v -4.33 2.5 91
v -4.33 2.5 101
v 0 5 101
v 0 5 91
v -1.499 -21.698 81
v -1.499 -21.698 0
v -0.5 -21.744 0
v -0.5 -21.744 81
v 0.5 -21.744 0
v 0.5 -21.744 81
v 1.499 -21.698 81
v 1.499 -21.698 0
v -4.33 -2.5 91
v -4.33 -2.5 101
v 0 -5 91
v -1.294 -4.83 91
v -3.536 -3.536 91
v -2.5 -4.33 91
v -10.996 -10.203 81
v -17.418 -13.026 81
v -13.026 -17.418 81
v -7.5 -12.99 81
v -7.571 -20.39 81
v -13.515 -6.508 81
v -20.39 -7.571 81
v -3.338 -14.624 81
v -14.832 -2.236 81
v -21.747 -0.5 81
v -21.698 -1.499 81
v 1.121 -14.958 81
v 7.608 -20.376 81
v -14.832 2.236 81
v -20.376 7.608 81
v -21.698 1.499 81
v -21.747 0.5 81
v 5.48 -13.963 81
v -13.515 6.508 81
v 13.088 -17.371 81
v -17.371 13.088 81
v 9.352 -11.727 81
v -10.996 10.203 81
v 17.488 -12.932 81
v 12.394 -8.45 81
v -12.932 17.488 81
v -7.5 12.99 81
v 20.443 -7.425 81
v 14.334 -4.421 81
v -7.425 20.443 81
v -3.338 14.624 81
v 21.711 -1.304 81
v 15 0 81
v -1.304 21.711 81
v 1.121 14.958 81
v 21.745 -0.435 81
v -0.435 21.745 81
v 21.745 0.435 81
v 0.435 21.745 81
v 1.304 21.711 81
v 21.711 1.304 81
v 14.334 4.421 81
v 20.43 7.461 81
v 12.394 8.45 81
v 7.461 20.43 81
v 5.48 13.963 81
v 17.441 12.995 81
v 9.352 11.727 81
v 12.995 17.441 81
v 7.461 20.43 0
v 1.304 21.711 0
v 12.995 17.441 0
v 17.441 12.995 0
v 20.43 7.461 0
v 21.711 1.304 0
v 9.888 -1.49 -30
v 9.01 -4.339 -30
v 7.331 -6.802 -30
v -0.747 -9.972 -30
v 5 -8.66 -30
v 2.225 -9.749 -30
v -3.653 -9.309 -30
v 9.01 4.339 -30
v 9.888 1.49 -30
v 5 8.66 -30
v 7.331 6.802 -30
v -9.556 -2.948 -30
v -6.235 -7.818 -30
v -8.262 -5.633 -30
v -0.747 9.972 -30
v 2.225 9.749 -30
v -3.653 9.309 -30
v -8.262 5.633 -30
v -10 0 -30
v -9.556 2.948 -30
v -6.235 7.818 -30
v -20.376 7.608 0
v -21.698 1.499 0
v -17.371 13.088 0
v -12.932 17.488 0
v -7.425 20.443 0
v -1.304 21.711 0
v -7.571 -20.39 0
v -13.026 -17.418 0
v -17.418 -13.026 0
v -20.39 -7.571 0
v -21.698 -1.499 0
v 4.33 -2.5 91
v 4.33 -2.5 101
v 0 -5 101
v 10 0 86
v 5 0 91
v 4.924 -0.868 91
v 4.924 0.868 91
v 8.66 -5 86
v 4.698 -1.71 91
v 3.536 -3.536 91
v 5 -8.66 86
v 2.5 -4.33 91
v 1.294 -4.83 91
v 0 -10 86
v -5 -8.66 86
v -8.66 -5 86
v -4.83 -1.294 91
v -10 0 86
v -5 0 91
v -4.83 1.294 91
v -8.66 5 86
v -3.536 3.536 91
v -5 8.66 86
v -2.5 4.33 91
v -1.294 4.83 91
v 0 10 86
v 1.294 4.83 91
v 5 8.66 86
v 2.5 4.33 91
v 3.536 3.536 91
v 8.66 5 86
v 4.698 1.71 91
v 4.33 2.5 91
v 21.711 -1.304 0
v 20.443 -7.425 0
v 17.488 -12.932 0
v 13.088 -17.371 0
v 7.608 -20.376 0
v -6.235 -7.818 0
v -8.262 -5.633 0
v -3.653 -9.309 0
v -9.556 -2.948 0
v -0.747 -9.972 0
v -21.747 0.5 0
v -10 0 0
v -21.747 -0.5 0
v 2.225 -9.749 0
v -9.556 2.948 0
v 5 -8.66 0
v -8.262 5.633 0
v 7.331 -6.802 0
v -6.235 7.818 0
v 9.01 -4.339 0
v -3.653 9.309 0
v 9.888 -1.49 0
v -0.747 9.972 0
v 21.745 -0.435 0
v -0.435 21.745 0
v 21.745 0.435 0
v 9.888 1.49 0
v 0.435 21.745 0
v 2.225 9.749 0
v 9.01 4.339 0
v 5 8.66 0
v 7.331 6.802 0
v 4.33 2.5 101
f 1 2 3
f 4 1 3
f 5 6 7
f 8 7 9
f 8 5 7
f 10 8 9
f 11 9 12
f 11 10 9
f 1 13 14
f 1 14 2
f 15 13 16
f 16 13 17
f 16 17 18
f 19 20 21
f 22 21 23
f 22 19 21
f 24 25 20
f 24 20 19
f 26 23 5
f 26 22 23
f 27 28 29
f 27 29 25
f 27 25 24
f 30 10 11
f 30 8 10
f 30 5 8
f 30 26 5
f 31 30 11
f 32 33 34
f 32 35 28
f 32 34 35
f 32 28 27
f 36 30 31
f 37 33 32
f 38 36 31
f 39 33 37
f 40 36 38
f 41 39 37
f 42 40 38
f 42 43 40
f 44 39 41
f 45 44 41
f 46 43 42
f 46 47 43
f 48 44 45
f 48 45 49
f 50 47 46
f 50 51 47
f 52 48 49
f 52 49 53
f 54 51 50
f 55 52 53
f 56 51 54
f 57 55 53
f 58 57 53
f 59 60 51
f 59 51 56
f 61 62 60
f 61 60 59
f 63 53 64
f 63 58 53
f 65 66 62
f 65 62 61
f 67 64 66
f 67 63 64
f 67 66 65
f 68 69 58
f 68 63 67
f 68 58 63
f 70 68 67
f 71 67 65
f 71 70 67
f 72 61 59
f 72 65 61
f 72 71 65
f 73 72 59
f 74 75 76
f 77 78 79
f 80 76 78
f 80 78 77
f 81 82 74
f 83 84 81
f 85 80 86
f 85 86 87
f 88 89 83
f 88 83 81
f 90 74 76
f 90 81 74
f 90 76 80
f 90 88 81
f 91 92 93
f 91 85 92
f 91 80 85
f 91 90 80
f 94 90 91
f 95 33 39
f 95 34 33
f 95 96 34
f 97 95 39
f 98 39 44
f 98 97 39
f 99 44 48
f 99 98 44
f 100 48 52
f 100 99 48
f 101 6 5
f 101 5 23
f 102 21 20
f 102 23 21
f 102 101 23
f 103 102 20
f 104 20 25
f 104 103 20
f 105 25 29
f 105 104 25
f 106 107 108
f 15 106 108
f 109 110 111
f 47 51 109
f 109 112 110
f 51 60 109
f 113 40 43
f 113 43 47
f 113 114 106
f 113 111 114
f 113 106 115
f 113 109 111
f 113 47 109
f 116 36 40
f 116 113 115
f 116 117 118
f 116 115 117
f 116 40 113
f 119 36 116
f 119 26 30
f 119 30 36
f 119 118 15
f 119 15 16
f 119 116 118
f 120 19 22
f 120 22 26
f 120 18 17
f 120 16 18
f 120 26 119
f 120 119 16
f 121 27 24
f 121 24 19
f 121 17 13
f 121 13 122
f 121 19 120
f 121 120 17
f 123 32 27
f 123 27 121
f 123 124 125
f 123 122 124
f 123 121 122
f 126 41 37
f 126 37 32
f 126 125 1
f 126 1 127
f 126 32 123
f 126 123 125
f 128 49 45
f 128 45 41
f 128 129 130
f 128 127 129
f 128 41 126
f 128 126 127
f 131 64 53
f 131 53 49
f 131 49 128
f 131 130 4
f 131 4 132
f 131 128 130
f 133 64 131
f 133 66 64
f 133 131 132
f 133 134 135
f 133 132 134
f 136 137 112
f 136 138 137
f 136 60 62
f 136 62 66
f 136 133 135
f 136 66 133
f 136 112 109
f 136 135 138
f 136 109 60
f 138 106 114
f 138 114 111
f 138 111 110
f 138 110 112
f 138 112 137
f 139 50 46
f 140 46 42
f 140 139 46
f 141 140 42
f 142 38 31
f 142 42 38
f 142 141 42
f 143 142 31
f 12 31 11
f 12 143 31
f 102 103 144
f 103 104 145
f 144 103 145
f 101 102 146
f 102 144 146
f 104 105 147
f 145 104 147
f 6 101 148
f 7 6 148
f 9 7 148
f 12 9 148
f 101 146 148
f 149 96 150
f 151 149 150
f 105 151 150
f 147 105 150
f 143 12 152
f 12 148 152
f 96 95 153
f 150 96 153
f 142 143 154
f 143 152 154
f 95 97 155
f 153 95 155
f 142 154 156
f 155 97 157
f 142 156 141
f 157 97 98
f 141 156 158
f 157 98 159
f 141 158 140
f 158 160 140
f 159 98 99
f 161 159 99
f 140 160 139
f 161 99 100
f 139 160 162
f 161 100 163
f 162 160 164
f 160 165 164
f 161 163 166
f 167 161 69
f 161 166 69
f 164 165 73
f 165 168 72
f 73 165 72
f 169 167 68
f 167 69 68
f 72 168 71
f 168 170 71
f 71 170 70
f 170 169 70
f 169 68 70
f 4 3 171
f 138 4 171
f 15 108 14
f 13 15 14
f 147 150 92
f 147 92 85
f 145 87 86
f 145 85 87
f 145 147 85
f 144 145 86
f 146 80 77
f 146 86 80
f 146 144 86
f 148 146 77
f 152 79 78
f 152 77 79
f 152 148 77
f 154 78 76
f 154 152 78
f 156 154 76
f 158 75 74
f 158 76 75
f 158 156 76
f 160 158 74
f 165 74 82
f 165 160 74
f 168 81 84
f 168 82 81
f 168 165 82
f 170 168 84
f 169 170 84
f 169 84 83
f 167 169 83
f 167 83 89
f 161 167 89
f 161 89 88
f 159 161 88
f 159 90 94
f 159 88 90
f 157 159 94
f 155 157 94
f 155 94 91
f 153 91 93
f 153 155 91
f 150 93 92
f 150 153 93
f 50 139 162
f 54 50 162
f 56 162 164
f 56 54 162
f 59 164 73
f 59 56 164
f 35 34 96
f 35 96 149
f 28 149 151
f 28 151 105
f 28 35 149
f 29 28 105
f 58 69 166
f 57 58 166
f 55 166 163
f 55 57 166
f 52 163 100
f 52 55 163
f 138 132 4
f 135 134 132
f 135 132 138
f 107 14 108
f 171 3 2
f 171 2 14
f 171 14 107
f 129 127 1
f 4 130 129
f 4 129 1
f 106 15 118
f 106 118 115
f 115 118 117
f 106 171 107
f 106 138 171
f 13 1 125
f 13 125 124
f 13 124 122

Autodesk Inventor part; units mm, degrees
ref_plane "YZ Plane" through (0, 0, 0) normal (1, 0, 0) x (0, 1, 0)
ref_plane "XZ Plane" through (0, 0, 0) normal (0, 1, 0) x (-1, 0, 0)
ref_plane "XY Plane" through (0, 0, 0) normal (0, 0, 1) x (1, 0, 0)
sketch "Boceto1" plane through (0, 0, 0) normal (0, 0, 1) x (1, 0, 0)
  circle A0 centre (0, 0) radius 21.75
  arc A1 (1.304413, 21.71085) -> (0, 23.055) centre (0, 21.75) ccw
  arc A2 (0, 23.055) -> (-1.304413, 21.71085) centre (0, 21.75) ccw
  line L0 (0, -21.75) -> (0, -23.25)
  arc A3 (0, -23.25) -> (1.499108, -21.698276) centre (0, -21.75) ccw
  arc A4 (-1.499108, -21.698276) -> (0, -23.25) centre (0, -21.75) ccw
  line L1 (21.75, 0) -> (23.055, 0)
  line L2 (-21.75, 0) -> (-23.25, 0)
  arc A5 (-21.698276, 1.499108) -> (-21.698276, -1.499108) centre (-21.75, 0) ccw
  arc A6 (21.71085, -1.304413) -> (21.71085, 1.304413) centre (21.75, 0) ccw
  dimension "d0" = 43.5
  dimension "d2" = 1.5
  dimension "d4" = 1.5
extrude "Extrusión1" add sketch "Boceto1" along normal blind 81
sketch "Boceto2" plane through (0, 0, 81) normal (0, 0, 1) x (1, 0, 0)
  line L0 (0, 5) -> (4.330127, 2.5)
  line L1 (4.330127, 2.5) -> (4.330127, -2.5)
  line L2 (4.330127, -2.5) -> (0, -5)
  line L3 (0, -5) -> (-4.330127, -2.5)
  line L4 (-4.330127, -2.5) -> (-4.330127, 2.5)
  line L5 (-4.330127, 2.5) -> (0, 5)
  point P0 (0, 0)
  point P1 (0, 0)
extrude "Extrusión2" add sketch "Boceto2" along normal blind 20
sketch "Boceto10" plane through (0, 0, 0) normal (0, 0, -1) x (-1, 0, 0)
  circle A0 centre (0, 0) radius 7.5
  dimension "d37" = 15
extrude "Extrusión9" add sketch "Boceto10" along normal blind 30
sketch "Boceto12" plane through (0, 0, 0) normal (0, 0, -1) x (-1, 0, 0)
  circle A0 centre (0, 0) radius 10
  dimension "d40" = 20
extrude "Extrusión10" add sketch "Boceto12" along normal blind 30
sketch "Boceto20" plane through (0, 0, 81) normal (0, 0, 1) x (1, 0, 0)
  circle A0 centre (0, 0) radius 15
  dimension "d61" = 30
ref_plane "Plano de trabajo1" through (0, 0, 91) normal (0, 0, 1) x (1, 0, 0)
sketch "Boceto21" plane through (0, 0, 91) normal (0, 0, 1) x (1, 0, 0)
  line L0 (4.330127, 2.5) -> (4.330127, -2.5)
  circle A0 centre (0, 0) radius 5
sketch "Boceto20 outline for Solevación1" plane through (0, 0, 81) normal (0, 0, 1) x (1, 0, 0)
  circle A0 centre (0, 0) radius 15
sketch "Boceto21 outline for Solevación1" plane through (0, 0, 91) normal (0, 0, 1) x (1, 0, 0)
  circle A0 centre (0, 0) radius 5
loft "Solevación1" add profiles "Boceto20 outline for Solevación1", "Boceto21 outline for Solevación1"
sketch "Boceto22" plane through (0, 0, 81) normal (0, 0, 1) x (1, 0, 0)
  arc A0 (1.304413, 21.71085) -> (-1.304413, 21.71085) centre (0, 21.75) ccw
  arc A1 (1.304413, 21.71085) -> (-1.304413, 21.71085) centre (0, 21.749554) ccw
  arc A2 (21.71085, -1.304413) -> (21.71085, 1.304413) centre (21.75, 0) ccw
  arc A3 (21.71085, -1.304413) -> (21.71085, 1.304413) centre (21.749554, 0) ccw
  arc A4 (-1.499108, -21.698276) -> (1.499108, -21.698276) centre (0, -21.75) ccw
  arc A5 (-1.499108, -21.698276) -> (1.499108, -21.698276) centre (0, -21.749411) ccw
  arc A6 (-21.698276, 1.499108) -> (-21.698276, -1.499108) centre (-21.75, 0) ccw
  arc A7 (-21.685394, 1.49099) -> (-21.698276, -1.499108) centre (-21.753079, -0.003795) ccw
  arc A8 (-21.698276, 1.499108) -> (-21.698276, -1.499108) centre (-1.222086, 0) ccw
  arc A9 (1.304413, 21.71085) -> (-1.304413, 21.71085) centre (0, -0.250446) ccw
  arc A10 (21.71085, -1.304413) -> (21.71085, 1.304413) centre (-0.250446, 0) ccw
  arc A11 (-1.499108, -21.698276) -> (1.499108, -21.698276) centre (0, 0.250589) ccw
  point P0 (0, 0)
sketch "Boceto22 outline for Extrusión16" plane through (0, 0, 81) normal (0, 0, 1) x (1, 0, 0)
  arc A0 (-1.304413, 21.71085) -> (1.304413, 21.71085) centre (0, -0.250446) cw
  arc A1 (1.304413, 21.71085) -> (-1.304413, 21.71085) centre (0, 21.75) ccw
  arc A2 (21.71085, 1.304413) -> (21.71085, -1.304413) centre (-0.250446, 0) cw
  arc A3 (21.71085, -1.304413) -> (21.71085, 1.304413) centre (21.75, 0) ccw
  arc A4 (-21.698276, -1.499108) -> (-21.698276, 1.499108) centre (-1.222086, 0) cw
  arc A5 (-21.698276, 1.499108) -> (-21.698276, -1.499108) centre (-21.75, 0) ccw
  arc A6 (1.499108, -21.698276) -> (-1.499108, -21.698276) centre (0, 0.250589) cw
  arc A7 (-1.499108, -21.698276) -> (1.499108, -21.698276) centre (0, -21.75) ccw
extrude "Extrusión16" cut sketch "Boceto22 outline for Extrusión16" against normal blind 211
properties part number "eix bobina"
